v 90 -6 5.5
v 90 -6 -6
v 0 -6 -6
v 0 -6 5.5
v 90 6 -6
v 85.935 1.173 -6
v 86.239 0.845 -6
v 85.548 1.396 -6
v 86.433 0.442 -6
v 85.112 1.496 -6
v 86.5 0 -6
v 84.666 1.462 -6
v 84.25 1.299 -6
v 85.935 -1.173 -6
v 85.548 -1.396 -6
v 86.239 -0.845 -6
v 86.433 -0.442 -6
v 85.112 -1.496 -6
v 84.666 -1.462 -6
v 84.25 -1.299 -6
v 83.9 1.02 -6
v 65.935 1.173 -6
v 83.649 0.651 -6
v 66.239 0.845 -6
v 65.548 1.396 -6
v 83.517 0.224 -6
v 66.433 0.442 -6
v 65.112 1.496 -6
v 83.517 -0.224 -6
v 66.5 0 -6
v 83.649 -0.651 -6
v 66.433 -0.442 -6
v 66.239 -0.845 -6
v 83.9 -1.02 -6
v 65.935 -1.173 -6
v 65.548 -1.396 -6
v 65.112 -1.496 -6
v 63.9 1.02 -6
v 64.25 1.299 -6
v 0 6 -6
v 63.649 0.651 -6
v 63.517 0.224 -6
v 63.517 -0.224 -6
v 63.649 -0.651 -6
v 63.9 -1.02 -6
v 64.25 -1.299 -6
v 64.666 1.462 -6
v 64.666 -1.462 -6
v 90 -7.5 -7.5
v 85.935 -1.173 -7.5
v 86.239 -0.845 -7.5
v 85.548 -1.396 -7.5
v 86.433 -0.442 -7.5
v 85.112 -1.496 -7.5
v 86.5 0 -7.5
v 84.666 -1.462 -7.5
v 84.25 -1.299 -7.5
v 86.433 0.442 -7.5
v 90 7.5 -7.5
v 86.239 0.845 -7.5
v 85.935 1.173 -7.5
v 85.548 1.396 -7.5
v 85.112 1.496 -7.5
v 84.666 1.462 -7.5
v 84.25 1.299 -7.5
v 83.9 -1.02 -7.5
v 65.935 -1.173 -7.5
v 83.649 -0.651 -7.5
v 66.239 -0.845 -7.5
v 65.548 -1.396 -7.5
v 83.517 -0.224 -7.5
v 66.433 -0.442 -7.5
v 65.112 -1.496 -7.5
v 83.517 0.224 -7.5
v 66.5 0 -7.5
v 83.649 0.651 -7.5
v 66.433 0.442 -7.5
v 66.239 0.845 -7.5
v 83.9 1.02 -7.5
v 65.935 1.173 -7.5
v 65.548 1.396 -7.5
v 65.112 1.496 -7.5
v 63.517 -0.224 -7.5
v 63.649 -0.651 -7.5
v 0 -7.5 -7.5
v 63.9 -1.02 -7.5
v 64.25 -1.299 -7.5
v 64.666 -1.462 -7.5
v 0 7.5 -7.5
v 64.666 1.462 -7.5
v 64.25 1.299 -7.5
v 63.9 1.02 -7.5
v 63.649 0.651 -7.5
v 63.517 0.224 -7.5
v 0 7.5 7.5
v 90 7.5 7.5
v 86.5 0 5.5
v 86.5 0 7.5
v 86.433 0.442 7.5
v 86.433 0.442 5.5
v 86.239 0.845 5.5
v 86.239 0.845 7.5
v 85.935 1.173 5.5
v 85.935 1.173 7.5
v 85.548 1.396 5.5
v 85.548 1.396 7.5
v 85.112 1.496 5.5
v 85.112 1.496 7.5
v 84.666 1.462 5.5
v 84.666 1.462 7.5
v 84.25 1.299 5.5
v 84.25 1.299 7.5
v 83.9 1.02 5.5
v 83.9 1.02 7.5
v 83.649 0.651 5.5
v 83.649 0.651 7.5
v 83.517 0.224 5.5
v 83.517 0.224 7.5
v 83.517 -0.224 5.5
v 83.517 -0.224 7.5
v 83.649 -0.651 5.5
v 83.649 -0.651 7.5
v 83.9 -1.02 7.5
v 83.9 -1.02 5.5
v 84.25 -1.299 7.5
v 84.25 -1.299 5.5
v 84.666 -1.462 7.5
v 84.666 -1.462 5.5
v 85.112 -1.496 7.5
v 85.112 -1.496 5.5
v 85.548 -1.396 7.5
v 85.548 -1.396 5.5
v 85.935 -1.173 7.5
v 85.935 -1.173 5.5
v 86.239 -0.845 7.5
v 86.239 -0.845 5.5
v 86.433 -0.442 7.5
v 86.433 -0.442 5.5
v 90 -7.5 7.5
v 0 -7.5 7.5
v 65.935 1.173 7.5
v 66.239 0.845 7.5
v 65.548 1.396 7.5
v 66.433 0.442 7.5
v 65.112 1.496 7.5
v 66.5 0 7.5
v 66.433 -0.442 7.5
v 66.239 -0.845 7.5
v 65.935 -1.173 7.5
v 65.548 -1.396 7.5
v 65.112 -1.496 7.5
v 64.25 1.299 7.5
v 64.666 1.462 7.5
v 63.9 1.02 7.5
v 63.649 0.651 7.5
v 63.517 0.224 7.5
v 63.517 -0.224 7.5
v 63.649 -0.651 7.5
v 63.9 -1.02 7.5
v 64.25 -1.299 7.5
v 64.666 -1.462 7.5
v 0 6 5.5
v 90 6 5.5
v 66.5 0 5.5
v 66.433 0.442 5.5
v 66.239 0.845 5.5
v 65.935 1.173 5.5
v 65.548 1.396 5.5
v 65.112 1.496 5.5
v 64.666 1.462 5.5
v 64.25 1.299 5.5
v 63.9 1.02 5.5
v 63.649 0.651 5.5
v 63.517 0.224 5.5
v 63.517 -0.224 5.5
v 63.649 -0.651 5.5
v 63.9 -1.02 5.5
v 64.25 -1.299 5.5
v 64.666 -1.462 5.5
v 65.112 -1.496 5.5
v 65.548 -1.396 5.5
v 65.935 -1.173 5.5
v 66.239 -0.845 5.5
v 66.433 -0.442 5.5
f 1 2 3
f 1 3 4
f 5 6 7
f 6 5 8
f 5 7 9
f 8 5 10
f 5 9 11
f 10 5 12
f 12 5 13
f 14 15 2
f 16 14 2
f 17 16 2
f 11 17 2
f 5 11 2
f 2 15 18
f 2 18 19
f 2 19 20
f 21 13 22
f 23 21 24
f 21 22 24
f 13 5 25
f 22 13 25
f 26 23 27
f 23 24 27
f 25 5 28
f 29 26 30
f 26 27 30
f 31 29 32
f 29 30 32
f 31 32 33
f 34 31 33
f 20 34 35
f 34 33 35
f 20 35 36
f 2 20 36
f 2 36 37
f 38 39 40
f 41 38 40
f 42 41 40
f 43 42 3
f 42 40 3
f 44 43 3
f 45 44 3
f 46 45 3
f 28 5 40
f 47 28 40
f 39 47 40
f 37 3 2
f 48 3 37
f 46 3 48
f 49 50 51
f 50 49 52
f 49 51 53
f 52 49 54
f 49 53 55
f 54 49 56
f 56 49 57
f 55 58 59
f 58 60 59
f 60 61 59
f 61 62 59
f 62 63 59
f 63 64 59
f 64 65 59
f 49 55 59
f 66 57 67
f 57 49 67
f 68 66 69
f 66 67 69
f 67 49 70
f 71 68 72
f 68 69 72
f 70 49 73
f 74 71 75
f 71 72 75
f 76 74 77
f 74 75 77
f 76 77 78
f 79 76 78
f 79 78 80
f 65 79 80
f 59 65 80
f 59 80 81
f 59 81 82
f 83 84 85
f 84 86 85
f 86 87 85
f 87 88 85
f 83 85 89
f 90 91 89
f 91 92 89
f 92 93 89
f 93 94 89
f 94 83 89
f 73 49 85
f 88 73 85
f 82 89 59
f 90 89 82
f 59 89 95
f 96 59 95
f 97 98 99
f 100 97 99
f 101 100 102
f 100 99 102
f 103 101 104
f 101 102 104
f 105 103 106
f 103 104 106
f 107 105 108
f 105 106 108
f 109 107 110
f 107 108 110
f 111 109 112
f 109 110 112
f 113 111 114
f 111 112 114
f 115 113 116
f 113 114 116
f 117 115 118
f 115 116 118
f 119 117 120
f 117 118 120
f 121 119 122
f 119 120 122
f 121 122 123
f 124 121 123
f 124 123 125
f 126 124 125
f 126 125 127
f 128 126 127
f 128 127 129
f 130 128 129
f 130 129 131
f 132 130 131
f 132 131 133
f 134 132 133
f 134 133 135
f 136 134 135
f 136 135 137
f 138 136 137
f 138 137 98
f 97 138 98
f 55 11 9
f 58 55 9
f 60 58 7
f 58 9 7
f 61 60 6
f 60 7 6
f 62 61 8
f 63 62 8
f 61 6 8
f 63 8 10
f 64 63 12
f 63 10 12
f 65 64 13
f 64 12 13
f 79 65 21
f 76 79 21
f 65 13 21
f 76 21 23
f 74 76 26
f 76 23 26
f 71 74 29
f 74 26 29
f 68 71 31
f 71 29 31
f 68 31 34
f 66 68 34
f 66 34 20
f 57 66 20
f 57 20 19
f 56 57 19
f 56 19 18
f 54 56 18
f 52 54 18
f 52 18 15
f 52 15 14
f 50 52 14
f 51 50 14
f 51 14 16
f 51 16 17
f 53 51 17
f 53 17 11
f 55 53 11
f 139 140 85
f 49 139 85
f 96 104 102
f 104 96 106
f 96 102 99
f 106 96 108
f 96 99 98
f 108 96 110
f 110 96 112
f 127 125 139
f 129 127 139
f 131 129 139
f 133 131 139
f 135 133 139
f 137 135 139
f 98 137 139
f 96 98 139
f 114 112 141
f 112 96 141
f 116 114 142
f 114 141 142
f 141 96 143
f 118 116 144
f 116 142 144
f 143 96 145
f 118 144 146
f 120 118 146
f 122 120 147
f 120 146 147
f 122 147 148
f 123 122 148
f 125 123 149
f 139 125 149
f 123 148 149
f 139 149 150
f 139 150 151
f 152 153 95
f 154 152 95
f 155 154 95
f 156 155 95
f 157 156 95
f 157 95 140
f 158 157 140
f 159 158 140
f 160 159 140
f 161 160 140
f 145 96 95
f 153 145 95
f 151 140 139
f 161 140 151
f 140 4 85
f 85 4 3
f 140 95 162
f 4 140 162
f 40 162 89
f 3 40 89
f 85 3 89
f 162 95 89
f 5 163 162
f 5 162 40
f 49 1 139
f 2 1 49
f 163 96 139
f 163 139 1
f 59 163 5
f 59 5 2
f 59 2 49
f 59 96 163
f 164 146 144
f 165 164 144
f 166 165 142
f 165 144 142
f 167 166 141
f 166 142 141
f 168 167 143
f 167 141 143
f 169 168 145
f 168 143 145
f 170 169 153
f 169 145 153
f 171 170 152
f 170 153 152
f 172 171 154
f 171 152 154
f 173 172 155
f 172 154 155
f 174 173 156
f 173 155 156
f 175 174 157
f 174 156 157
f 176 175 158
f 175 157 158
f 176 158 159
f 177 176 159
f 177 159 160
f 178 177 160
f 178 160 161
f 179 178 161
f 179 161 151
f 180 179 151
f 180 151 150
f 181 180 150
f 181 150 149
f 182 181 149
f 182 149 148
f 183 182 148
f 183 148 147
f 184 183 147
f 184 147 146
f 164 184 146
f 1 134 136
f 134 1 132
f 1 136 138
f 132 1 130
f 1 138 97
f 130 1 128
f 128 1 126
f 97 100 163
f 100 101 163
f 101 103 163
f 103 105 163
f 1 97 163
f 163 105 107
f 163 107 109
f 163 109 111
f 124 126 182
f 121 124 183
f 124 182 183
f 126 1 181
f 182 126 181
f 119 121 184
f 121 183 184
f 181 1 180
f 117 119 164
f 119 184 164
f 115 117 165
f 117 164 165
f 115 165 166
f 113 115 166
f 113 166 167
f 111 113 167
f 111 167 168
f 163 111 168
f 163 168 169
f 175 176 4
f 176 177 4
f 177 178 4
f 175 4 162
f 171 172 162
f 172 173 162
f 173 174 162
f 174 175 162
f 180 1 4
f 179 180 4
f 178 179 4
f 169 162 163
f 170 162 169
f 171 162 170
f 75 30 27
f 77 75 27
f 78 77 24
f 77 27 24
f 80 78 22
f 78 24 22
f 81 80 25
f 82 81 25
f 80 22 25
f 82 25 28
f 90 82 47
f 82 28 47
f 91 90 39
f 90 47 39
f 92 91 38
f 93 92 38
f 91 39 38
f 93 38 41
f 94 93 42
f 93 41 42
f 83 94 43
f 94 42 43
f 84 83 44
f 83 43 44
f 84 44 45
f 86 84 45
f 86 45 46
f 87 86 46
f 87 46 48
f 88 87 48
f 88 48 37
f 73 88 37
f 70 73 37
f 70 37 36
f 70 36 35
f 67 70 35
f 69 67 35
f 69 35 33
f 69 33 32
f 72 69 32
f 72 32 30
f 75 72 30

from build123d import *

# Parameters (mm, degrees)
MEMBER_15_15_1_5_1_DEPTH = 90
SKETCH_3_R               = 1.5
CUT_EXTRUDE_1_DEPTH      = 92.549167118


with BuildPart() as part:
    # Sketch1 → Member 15 _15_ 1.5_1 (new body)
    with BuildSketch(Plane(origin=(0, 0, 0), x_dir=(0, 0, -1), z_dir=(1, 0, 0))):
        Polygon((-6, -7.5), (6, -7.5), (7.5, -7.5), (7.5, -6), (7.5, 6), (7.5, 7.5), (6, 7.5), (-6, 7.5), (-7.5, 7.5), (-7.5, 6), (-7.5, -6), (-7.5, -7.5), align=None)
        Polygon((-4, -6), (4, -6), (6, -6), (6, -3.5), (6, 3.5), (6, 6), (3.5, 6), (-3.5, 6), (-5.5, 6), (-5.5, 3.5), (-5.5, -3.5), (-5.5, -6), align=None, mode=Mode.SUBTRACT)
    extrude(amount=MEMBER_15_15_1_5_1_DEPTH)

    # 草图3 → 切除-拉伸1 (cut, through all)
    with BuildSketch(Plane.XY.offset(7.5)):
        with Locations((85, 0)):
            Circle(SKETCH_3_R)
        with Locations((65, 0)):
            Circle(SKETCH_3_R)
    extrude(amount=-CUT_EXTRUDE_1_DEPTH, mode=Mode.SUBTRACT)


solid = part.part
